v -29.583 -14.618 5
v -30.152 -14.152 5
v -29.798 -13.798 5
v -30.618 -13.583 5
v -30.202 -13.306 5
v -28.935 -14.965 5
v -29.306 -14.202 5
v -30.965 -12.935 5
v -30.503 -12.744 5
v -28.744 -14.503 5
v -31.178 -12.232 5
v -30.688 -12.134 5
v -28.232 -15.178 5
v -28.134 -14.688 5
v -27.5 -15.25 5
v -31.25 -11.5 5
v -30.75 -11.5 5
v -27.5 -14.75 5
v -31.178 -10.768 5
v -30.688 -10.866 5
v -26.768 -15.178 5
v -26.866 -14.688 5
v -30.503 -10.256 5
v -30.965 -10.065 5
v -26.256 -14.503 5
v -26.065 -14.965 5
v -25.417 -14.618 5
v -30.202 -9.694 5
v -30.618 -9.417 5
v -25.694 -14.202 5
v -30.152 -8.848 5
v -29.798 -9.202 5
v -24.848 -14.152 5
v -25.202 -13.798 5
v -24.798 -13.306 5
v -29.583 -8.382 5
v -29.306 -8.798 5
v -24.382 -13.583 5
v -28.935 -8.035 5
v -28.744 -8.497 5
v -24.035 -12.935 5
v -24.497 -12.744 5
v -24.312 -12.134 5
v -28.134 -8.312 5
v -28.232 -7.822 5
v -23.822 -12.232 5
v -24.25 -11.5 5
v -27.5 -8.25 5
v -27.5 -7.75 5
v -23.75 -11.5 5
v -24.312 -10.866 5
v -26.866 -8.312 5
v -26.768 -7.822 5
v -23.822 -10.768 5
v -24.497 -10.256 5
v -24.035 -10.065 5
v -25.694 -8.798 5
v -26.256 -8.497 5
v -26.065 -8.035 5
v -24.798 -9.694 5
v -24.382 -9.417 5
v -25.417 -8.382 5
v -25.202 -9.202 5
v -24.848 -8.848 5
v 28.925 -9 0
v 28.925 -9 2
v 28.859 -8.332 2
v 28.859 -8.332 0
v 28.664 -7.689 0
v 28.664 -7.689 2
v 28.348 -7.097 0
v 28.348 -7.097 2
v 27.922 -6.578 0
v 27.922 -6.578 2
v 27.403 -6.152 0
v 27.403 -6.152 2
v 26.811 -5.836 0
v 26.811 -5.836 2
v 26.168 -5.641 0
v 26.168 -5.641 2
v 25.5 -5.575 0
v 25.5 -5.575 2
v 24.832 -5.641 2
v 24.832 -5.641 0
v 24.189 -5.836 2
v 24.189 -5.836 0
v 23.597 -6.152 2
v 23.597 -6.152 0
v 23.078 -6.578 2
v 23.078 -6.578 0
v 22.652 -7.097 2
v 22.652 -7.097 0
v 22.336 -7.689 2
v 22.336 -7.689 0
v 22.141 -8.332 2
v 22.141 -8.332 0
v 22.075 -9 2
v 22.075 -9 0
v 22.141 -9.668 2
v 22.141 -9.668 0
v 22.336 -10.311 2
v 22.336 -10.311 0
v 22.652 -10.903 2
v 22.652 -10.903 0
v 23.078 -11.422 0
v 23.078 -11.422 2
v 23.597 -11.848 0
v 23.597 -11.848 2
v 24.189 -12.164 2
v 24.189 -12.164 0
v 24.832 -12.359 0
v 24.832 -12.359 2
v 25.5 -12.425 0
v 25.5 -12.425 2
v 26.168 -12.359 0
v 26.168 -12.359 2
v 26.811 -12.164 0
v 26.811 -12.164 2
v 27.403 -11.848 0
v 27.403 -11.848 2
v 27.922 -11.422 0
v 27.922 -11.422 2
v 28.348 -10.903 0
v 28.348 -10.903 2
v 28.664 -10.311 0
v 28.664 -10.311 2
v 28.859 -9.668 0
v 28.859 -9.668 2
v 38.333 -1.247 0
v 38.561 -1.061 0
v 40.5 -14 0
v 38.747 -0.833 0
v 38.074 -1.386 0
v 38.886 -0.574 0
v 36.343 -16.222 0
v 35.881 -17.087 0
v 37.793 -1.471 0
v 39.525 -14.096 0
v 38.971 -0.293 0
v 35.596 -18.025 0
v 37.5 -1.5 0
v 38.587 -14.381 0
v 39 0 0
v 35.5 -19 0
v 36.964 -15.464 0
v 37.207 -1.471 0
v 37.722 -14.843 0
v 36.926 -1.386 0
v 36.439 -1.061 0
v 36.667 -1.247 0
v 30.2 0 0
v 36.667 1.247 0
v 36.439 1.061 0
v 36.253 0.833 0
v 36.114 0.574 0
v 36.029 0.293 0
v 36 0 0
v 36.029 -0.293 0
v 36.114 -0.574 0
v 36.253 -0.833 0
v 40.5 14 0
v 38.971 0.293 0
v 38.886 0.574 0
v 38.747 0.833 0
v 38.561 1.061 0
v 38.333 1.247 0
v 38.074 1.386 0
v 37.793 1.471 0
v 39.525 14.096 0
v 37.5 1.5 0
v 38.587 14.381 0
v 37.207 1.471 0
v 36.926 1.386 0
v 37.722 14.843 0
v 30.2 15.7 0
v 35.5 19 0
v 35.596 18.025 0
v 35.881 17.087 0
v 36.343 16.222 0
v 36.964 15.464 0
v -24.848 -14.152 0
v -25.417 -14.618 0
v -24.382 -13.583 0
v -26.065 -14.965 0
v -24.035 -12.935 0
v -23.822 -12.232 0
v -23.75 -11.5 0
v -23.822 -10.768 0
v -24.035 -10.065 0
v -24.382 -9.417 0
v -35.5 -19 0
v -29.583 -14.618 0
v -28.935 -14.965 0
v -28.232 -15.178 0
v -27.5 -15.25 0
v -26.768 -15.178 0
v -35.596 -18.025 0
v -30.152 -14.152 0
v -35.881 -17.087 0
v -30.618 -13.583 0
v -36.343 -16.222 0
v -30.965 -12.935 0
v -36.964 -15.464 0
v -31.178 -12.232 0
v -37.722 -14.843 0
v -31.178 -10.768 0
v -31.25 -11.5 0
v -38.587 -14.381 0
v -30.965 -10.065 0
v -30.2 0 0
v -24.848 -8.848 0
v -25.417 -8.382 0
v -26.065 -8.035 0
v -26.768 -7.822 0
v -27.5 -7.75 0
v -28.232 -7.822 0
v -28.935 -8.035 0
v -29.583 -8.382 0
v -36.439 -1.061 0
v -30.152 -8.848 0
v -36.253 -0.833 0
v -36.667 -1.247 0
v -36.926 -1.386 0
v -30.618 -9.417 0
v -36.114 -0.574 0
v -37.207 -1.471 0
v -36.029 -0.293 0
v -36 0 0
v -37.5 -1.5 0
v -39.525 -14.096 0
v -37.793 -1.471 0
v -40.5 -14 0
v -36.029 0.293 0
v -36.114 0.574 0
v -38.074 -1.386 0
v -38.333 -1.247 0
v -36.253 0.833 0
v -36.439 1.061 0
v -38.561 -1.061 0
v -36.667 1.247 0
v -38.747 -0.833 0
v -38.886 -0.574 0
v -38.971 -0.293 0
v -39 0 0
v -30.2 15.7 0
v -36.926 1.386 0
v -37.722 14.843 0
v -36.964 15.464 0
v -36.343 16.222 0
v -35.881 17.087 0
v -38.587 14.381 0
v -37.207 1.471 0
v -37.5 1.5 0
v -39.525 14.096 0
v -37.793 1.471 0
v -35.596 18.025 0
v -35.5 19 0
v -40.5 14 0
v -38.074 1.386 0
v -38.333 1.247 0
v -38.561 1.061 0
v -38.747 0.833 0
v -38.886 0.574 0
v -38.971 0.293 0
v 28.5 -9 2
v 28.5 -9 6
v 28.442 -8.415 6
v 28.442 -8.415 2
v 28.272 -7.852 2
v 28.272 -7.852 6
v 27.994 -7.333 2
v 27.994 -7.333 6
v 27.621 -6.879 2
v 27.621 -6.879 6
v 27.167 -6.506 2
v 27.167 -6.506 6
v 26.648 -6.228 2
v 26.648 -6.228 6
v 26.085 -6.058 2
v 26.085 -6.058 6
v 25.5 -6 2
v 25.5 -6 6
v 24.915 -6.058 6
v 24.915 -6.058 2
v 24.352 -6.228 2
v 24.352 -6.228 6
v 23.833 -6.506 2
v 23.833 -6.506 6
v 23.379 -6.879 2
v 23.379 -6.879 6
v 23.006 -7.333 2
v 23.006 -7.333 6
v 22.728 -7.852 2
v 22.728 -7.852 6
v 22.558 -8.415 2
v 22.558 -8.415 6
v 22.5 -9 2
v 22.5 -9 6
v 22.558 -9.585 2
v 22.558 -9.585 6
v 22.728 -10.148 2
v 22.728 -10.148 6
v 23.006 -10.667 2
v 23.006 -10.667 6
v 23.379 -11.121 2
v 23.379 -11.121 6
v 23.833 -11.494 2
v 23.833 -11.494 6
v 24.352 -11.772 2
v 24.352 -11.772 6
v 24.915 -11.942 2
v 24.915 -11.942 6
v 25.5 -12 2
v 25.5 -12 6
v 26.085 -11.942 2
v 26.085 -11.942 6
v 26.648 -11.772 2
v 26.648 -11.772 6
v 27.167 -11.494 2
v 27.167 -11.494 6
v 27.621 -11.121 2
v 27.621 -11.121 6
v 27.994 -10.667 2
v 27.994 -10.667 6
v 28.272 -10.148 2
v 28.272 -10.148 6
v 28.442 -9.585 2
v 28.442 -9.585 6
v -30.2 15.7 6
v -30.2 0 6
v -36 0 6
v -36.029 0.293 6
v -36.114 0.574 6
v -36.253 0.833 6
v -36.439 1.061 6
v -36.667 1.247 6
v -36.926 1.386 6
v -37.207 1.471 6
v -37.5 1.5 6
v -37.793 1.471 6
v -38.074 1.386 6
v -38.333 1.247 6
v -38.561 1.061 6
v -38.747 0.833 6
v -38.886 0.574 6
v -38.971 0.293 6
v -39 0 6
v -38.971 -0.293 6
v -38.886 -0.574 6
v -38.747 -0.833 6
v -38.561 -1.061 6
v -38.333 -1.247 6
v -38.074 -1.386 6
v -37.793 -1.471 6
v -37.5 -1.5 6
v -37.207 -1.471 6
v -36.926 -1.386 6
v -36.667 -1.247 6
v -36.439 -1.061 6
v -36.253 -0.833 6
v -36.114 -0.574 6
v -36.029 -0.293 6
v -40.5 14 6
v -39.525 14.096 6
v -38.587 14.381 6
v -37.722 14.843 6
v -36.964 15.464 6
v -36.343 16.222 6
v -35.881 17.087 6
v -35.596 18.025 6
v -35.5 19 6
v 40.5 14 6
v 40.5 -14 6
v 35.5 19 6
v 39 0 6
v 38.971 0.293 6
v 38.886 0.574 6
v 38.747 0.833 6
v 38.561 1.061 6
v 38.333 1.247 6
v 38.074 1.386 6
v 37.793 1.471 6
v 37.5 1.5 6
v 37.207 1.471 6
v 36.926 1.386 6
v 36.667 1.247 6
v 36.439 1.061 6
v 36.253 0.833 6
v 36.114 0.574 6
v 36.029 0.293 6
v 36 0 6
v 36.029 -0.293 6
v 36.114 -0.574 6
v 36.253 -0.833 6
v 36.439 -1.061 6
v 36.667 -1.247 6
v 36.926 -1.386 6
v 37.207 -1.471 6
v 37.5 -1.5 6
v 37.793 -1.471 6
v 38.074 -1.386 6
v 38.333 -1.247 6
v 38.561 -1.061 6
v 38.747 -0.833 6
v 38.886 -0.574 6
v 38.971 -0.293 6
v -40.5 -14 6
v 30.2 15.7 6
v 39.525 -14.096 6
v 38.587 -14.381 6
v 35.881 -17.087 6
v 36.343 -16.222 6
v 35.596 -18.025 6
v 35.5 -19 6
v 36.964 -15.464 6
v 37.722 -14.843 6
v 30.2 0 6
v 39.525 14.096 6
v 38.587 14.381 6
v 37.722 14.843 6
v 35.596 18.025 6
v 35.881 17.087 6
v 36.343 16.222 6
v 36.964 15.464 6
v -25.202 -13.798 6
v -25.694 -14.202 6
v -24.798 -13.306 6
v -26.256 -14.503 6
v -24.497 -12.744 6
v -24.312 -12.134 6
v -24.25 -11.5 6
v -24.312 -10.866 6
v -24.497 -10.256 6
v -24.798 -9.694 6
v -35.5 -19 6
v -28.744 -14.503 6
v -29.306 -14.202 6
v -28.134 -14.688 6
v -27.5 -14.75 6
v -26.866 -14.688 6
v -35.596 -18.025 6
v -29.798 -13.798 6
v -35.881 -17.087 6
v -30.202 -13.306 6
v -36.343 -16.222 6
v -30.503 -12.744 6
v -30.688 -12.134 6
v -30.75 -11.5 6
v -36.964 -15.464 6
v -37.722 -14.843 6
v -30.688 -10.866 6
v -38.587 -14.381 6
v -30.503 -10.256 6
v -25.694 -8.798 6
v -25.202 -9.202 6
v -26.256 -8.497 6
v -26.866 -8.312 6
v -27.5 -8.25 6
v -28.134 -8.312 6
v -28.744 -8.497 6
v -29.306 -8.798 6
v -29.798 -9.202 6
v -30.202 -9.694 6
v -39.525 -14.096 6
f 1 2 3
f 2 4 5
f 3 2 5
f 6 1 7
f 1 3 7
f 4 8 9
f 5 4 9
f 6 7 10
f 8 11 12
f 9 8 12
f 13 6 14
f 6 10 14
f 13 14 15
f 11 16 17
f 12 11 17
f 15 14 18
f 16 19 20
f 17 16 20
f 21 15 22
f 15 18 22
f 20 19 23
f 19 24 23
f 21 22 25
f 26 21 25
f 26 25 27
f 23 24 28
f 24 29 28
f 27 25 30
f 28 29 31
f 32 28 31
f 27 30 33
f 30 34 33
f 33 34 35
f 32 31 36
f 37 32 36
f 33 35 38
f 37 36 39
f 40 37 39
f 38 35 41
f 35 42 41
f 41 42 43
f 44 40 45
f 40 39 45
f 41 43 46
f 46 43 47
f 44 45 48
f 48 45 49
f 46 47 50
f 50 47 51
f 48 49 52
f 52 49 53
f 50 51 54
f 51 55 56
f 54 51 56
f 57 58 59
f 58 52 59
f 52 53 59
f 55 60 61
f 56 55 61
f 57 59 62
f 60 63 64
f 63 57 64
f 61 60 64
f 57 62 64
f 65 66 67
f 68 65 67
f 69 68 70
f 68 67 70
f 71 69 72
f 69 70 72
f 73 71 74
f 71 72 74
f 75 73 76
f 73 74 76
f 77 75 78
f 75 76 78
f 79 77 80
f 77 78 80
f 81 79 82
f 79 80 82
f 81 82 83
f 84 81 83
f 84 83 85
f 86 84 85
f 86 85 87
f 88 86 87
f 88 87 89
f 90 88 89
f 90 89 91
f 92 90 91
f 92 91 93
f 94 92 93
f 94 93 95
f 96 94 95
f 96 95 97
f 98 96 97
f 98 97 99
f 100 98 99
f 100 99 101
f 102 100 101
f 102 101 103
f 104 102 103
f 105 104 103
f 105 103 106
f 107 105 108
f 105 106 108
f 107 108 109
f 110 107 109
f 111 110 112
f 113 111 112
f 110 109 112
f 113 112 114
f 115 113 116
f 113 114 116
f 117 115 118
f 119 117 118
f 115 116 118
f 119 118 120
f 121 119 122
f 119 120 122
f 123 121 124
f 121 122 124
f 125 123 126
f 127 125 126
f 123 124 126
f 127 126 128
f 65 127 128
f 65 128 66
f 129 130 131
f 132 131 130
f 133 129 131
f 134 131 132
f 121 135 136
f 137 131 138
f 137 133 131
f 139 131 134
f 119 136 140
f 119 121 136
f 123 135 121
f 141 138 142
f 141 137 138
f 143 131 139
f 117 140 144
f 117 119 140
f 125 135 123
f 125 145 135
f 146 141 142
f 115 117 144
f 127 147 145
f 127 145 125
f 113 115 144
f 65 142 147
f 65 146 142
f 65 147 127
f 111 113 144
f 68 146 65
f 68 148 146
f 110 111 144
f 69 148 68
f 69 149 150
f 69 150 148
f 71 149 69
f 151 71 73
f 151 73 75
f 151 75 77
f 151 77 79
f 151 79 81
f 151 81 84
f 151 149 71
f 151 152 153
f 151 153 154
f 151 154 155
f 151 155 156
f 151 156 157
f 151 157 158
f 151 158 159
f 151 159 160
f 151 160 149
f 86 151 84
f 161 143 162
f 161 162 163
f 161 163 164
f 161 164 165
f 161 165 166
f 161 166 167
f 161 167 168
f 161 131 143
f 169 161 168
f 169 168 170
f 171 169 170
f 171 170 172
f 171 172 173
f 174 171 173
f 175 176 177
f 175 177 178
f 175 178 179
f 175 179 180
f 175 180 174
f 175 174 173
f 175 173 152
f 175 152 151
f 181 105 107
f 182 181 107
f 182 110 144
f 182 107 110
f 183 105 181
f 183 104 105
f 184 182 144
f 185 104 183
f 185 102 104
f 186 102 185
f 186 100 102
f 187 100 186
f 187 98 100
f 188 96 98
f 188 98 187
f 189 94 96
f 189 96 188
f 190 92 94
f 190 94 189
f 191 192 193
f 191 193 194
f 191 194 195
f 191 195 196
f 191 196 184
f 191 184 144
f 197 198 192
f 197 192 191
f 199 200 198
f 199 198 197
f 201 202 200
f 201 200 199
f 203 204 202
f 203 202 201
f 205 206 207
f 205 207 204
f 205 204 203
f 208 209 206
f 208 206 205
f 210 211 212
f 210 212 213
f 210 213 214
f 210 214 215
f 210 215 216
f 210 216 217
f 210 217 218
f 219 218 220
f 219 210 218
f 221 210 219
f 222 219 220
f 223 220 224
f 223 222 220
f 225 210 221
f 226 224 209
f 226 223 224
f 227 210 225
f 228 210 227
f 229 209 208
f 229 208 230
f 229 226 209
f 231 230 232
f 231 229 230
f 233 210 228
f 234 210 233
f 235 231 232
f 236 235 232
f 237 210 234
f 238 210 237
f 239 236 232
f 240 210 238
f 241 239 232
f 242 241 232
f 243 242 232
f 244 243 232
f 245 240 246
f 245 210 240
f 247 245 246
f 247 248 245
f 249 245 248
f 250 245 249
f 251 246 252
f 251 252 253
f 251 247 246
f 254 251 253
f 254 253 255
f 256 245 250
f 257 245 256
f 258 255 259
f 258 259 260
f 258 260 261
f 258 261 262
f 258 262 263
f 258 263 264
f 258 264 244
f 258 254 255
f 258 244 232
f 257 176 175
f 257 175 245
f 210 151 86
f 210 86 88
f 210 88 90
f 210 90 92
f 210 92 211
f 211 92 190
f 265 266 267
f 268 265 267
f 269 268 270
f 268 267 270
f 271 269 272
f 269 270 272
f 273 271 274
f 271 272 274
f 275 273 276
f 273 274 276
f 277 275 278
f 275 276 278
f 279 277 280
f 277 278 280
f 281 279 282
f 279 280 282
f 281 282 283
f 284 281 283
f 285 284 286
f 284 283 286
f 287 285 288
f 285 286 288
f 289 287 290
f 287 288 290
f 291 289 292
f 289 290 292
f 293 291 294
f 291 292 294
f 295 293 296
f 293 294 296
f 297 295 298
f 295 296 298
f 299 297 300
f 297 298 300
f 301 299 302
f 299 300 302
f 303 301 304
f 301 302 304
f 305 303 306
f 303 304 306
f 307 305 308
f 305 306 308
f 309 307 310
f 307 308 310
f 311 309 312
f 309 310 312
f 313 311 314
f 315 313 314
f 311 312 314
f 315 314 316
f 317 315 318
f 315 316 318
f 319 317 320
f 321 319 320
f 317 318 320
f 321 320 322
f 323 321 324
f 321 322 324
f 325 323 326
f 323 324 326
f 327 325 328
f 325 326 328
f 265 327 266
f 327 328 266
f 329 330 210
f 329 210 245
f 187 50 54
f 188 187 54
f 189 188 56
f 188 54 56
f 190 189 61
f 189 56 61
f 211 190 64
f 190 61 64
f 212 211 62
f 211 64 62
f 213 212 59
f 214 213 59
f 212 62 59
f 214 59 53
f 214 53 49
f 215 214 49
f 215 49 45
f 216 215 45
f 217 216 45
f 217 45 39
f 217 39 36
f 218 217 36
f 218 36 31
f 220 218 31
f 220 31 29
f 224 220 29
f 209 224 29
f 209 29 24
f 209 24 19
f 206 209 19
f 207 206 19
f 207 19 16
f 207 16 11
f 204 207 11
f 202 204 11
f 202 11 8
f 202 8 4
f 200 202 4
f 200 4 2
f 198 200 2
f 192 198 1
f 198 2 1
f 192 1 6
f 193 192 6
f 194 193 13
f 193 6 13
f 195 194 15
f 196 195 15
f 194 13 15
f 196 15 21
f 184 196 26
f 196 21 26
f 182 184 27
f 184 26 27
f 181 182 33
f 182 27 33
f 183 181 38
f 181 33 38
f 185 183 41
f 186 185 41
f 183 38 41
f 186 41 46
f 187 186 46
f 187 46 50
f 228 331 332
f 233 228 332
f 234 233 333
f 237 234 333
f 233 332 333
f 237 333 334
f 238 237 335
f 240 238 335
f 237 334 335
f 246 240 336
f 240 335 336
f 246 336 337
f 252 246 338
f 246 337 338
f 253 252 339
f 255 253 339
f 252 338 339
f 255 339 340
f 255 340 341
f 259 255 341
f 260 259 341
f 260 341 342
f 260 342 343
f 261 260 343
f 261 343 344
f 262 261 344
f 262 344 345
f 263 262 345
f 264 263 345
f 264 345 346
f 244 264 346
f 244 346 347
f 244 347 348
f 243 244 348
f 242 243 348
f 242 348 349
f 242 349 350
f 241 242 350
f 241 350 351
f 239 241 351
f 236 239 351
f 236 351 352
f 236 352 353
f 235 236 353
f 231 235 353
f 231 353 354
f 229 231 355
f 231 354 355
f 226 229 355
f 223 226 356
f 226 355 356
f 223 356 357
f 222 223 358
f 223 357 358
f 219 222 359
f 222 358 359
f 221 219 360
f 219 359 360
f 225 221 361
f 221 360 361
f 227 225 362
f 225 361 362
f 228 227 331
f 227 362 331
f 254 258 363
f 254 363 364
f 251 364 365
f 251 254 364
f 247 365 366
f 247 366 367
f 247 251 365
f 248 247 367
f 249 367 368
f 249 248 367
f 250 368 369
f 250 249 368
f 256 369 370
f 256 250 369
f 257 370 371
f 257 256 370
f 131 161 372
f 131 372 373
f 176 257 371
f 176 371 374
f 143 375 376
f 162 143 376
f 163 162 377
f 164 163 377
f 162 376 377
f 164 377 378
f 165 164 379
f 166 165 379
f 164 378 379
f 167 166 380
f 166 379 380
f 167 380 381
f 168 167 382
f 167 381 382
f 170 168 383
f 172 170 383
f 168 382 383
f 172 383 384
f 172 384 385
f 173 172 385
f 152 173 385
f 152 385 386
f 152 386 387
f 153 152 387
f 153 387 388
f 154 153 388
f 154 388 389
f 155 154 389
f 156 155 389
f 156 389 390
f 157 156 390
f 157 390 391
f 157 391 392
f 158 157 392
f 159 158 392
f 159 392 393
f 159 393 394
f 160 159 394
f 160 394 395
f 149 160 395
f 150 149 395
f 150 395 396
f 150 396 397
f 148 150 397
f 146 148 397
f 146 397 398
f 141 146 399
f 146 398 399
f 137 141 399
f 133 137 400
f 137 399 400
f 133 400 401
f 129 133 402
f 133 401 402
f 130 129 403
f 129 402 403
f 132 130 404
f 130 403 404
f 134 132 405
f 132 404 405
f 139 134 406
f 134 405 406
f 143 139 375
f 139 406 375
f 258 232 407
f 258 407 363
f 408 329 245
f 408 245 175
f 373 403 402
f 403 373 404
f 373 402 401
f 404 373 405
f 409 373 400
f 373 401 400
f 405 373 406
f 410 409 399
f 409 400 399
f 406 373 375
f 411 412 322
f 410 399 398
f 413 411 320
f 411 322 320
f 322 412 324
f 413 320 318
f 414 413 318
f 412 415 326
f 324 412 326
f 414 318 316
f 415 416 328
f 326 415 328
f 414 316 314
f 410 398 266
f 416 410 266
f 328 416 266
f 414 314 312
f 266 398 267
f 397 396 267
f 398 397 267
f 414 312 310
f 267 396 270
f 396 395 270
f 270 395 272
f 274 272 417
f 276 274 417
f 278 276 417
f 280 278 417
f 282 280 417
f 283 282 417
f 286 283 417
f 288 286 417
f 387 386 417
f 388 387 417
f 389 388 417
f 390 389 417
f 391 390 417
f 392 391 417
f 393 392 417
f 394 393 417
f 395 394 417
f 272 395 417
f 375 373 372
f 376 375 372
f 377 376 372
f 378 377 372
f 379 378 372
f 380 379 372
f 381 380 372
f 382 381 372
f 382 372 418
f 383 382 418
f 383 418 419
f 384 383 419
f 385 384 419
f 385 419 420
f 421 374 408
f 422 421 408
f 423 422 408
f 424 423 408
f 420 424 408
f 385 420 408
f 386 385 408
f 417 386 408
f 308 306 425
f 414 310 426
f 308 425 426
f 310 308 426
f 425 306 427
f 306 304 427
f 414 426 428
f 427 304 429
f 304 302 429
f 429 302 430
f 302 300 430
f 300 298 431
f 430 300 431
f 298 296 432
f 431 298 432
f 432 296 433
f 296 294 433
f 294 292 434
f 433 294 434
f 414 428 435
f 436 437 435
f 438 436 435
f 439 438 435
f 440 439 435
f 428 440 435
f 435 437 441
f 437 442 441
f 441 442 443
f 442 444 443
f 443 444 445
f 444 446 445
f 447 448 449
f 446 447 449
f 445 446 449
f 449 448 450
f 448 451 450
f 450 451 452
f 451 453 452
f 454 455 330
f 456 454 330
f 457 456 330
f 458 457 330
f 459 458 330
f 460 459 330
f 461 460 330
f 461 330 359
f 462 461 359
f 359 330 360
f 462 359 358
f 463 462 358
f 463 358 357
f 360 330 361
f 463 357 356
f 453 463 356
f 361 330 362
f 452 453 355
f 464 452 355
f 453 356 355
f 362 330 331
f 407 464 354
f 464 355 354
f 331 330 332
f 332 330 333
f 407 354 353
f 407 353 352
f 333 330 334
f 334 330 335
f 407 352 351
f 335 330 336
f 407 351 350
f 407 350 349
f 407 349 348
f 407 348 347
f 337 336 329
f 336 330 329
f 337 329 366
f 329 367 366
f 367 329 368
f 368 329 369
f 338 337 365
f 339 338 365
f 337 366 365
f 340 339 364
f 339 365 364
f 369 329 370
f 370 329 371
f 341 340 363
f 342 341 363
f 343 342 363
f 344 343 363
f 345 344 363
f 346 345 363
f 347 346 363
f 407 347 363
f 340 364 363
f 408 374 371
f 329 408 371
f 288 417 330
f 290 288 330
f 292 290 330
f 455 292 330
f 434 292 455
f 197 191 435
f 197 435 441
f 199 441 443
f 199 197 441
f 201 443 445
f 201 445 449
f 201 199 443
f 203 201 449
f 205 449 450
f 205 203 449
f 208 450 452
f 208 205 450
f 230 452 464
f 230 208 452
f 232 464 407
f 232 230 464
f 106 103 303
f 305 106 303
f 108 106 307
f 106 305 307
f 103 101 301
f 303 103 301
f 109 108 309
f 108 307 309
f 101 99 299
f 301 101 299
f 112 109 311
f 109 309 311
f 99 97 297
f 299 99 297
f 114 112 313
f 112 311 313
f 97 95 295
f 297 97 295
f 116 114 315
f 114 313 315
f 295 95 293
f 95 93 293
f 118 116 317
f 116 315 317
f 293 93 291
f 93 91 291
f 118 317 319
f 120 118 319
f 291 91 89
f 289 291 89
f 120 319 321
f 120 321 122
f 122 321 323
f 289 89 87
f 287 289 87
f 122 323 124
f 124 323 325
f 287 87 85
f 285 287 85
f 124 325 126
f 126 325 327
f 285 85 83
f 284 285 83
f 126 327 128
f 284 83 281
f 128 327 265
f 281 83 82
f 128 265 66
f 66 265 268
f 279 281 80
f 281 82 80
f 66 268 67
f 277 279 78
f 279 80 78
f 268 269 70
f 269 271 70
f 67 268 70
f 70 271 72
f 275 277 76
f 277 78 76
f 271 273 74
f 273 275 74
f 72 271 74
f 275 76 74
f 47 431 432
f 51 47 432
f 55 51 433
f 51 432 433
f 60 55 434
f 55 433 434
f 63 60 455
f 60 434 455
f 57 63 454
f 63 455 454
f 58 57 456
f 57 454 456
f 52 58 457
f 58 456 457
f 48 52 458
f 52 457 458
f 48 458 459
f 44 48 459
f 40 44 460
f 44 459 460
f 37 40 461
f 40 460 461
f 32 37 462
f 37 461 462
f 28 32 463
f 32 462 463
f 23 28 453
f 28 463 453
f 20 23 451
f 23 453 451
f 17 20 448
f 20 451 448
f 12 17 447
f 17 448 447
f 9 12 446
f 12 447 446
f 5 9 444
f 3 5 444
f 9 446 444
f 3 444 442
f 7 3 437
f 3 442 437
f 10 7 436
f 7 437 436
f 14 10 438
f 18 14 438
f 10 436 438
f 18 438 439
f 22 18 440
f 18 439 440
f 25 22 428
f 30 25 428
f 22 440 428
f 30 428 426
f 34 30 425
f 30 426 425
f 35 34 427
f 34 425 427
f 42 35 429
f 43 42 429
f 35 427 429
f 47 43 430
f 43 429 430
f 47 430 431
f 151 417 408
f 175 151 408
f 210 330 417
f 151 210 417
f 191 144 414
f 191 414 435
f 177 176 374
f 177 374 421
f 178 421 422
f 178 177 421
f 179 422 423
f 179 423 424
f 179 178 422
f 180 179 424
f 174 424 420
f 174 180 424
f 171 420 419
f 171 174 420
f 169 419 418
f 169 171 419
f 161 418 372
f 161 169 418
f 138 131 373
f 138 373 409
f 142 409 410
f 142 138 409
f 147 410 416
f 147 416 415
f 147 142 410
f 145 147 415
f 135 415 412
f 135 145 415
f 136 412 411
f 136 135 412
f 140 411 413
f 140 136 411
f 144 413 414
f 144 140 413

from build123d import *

# Parameters (mm, degrees)
BASE_DEPTH                        = 6
SKETCH2_R                         = 1.5
SCREWS_CUT_DEPTH                  = 1
SCREWS_CUT_DEPTH_BACK             = 7
SKETCH4_W                         = 60.4
SKETCH4_H                         = 15.7
LCD_CUT_DEPTH                     = 1
LCD_CUT_DEPTH_BACK                = 7
SKETCH5_R                         = 3.75
TESTBUTTON_BIG_CUT_DEPTH          = 1
TESTBUTTON_BIG_CUT_DEPTH_BACK     = 7
SKETCH6_R                         = 4
SKETCH6_R_2                       = 3.25
TESTBUTTON_PIECE_MAINTAINER_DEPTH = 1
SKETCH7_R                         = 3.425
BRIGHTNESS_CUT_DEPTH              = 1
BRIGHTNESS_CUT_DEPTH_BACK         = 7
SKETCH8_R                         = 3.5
SKETCH8_R_2                       = 3
BRIGHTNESS_BACK_CUT_DEPTH         = 4


with BuildPart() as part:
    # Sketch1 → Base (new body)
    with BuildSketch(Plane.XY):
        with BuildLine():
            Line((-35.5, 19), (35.5, 19))
            ThreePointArc((35.5, 19), (36.964466094, 15.464466094), (40.5, 14))
            Line((40.5, 14), (40.5, -14))
            ThreePointArc((40.5, -14), (36.964466094, -15.464466094), (35.5, -19))
            Line((35.5, -19), (-35.5, -19))
            ThreePointArc((-35.5, -19), (-36.964466094, -15.464466094), (-40.5, -14))
            Line((-40.5, -14), (-40.5, 14))
            ThreePointArc((-40.5, 14), (-36.964466094, 15.464466094), (-35.5, 19))
        make_face()
    extrude(amount=BASE_DEPTH)

    # Sketch2 → Screws Cut (cut, two sides)
    with BuildSketch(Plane.XY.offset(6)) as screws_cut_sk:
        with Locations((-37.5, 0)):
            Circle(SKETCH2_R)
        with Locations((37.5, 0)):
            Circle(SKETCH2_R)
    extrude(amount=SCREWS_CUT_DEPTH, mode=Mode.SUBTRACT)
    extrude(screws_cut_sk.sketch, amount=-SCREWS_CUT_DEPTH_BACK, mode=Mode.SUBTRACT)

    # Sketch4 → LCD Cut (cut, two sides)
    with BuildSketch(Plane.XY.offset(6)) as lcd_cut_sk:
        with Locations((0, 7.85)):
            Rectangle(SKETCH4_W, SKETCH4_H)
    extrude(amount=LCD_CUT_DEPTH, mode=Mode.SUBTRACT)
    extrude(lcd_cut_sk.sketch, amount=-LCD_CUT_DEPTH_BACK, mode=Mode.SUBTRACT)

    # Sketch5 → TestButton Big Cut (cut, two sides)
    with BuildSketch(Plane.XY.offset(6)) as testbutton_big_cut_sk:
        with Locations((-27.5, -11.5)):
            Circle(SKETCH5_R)
    extrude(amount=TESTBUTTON_BIG_CUT_DEPTH, mode=Mode.SUBTRACT)
    extrude(testbutton_big_cut_sk.sketch, amount=-TESTBUTTON_BIG_CUT_DEPTH_BACK, mode=Mode.SUBTRACT)

    # Sketch6 → TestButton Piece Maintainer (add)
    with BuildSketch(Plane.XY.offset(6)):
        with Locations((-27.5, -11.5)):
            Circle(SKETCH6_R)
        with Locations((-27.5, -11.5)):
            Circle(SKETCH6_R_2, mode=Mode.SUBTRACT)
    extrude(amount=-TESTBUTTON_PIECE_MAINTAINER_DEPTH)

    # Sketch7 → Brightness Cut (cut, two sides)
    with BuildSketch(Plane.XY.offset(6)) as brightness_cut_sk:
        with Locations((25.5, -9)):
            Circle(SKETCH7_R)
    extrude(amount=BRIGHTNESS_CUT_DEPTH, mode=Mode.SUBTRACT)
    extrude(brightness_cut_sk.sketch, amount=-BRIGHTNESS_CUT_DEPTH_BACK, mode=Mode.SUBTRACT)

    # Sketch8 → Brightness Back Cut (add)
    with BuildSketch(Plane.XY.offset(6)):
        with Locations((25.5, -9)):
            Circle(SKETCH8_R)
        with Locations((25.5, -9)):
            Circle(SKETCH8_R_2, mode=Mode.SUBTRACT)
    extrude(amount=-BRIGHTNESS_BACK_CUT_DEPTH)


solid = part.part
